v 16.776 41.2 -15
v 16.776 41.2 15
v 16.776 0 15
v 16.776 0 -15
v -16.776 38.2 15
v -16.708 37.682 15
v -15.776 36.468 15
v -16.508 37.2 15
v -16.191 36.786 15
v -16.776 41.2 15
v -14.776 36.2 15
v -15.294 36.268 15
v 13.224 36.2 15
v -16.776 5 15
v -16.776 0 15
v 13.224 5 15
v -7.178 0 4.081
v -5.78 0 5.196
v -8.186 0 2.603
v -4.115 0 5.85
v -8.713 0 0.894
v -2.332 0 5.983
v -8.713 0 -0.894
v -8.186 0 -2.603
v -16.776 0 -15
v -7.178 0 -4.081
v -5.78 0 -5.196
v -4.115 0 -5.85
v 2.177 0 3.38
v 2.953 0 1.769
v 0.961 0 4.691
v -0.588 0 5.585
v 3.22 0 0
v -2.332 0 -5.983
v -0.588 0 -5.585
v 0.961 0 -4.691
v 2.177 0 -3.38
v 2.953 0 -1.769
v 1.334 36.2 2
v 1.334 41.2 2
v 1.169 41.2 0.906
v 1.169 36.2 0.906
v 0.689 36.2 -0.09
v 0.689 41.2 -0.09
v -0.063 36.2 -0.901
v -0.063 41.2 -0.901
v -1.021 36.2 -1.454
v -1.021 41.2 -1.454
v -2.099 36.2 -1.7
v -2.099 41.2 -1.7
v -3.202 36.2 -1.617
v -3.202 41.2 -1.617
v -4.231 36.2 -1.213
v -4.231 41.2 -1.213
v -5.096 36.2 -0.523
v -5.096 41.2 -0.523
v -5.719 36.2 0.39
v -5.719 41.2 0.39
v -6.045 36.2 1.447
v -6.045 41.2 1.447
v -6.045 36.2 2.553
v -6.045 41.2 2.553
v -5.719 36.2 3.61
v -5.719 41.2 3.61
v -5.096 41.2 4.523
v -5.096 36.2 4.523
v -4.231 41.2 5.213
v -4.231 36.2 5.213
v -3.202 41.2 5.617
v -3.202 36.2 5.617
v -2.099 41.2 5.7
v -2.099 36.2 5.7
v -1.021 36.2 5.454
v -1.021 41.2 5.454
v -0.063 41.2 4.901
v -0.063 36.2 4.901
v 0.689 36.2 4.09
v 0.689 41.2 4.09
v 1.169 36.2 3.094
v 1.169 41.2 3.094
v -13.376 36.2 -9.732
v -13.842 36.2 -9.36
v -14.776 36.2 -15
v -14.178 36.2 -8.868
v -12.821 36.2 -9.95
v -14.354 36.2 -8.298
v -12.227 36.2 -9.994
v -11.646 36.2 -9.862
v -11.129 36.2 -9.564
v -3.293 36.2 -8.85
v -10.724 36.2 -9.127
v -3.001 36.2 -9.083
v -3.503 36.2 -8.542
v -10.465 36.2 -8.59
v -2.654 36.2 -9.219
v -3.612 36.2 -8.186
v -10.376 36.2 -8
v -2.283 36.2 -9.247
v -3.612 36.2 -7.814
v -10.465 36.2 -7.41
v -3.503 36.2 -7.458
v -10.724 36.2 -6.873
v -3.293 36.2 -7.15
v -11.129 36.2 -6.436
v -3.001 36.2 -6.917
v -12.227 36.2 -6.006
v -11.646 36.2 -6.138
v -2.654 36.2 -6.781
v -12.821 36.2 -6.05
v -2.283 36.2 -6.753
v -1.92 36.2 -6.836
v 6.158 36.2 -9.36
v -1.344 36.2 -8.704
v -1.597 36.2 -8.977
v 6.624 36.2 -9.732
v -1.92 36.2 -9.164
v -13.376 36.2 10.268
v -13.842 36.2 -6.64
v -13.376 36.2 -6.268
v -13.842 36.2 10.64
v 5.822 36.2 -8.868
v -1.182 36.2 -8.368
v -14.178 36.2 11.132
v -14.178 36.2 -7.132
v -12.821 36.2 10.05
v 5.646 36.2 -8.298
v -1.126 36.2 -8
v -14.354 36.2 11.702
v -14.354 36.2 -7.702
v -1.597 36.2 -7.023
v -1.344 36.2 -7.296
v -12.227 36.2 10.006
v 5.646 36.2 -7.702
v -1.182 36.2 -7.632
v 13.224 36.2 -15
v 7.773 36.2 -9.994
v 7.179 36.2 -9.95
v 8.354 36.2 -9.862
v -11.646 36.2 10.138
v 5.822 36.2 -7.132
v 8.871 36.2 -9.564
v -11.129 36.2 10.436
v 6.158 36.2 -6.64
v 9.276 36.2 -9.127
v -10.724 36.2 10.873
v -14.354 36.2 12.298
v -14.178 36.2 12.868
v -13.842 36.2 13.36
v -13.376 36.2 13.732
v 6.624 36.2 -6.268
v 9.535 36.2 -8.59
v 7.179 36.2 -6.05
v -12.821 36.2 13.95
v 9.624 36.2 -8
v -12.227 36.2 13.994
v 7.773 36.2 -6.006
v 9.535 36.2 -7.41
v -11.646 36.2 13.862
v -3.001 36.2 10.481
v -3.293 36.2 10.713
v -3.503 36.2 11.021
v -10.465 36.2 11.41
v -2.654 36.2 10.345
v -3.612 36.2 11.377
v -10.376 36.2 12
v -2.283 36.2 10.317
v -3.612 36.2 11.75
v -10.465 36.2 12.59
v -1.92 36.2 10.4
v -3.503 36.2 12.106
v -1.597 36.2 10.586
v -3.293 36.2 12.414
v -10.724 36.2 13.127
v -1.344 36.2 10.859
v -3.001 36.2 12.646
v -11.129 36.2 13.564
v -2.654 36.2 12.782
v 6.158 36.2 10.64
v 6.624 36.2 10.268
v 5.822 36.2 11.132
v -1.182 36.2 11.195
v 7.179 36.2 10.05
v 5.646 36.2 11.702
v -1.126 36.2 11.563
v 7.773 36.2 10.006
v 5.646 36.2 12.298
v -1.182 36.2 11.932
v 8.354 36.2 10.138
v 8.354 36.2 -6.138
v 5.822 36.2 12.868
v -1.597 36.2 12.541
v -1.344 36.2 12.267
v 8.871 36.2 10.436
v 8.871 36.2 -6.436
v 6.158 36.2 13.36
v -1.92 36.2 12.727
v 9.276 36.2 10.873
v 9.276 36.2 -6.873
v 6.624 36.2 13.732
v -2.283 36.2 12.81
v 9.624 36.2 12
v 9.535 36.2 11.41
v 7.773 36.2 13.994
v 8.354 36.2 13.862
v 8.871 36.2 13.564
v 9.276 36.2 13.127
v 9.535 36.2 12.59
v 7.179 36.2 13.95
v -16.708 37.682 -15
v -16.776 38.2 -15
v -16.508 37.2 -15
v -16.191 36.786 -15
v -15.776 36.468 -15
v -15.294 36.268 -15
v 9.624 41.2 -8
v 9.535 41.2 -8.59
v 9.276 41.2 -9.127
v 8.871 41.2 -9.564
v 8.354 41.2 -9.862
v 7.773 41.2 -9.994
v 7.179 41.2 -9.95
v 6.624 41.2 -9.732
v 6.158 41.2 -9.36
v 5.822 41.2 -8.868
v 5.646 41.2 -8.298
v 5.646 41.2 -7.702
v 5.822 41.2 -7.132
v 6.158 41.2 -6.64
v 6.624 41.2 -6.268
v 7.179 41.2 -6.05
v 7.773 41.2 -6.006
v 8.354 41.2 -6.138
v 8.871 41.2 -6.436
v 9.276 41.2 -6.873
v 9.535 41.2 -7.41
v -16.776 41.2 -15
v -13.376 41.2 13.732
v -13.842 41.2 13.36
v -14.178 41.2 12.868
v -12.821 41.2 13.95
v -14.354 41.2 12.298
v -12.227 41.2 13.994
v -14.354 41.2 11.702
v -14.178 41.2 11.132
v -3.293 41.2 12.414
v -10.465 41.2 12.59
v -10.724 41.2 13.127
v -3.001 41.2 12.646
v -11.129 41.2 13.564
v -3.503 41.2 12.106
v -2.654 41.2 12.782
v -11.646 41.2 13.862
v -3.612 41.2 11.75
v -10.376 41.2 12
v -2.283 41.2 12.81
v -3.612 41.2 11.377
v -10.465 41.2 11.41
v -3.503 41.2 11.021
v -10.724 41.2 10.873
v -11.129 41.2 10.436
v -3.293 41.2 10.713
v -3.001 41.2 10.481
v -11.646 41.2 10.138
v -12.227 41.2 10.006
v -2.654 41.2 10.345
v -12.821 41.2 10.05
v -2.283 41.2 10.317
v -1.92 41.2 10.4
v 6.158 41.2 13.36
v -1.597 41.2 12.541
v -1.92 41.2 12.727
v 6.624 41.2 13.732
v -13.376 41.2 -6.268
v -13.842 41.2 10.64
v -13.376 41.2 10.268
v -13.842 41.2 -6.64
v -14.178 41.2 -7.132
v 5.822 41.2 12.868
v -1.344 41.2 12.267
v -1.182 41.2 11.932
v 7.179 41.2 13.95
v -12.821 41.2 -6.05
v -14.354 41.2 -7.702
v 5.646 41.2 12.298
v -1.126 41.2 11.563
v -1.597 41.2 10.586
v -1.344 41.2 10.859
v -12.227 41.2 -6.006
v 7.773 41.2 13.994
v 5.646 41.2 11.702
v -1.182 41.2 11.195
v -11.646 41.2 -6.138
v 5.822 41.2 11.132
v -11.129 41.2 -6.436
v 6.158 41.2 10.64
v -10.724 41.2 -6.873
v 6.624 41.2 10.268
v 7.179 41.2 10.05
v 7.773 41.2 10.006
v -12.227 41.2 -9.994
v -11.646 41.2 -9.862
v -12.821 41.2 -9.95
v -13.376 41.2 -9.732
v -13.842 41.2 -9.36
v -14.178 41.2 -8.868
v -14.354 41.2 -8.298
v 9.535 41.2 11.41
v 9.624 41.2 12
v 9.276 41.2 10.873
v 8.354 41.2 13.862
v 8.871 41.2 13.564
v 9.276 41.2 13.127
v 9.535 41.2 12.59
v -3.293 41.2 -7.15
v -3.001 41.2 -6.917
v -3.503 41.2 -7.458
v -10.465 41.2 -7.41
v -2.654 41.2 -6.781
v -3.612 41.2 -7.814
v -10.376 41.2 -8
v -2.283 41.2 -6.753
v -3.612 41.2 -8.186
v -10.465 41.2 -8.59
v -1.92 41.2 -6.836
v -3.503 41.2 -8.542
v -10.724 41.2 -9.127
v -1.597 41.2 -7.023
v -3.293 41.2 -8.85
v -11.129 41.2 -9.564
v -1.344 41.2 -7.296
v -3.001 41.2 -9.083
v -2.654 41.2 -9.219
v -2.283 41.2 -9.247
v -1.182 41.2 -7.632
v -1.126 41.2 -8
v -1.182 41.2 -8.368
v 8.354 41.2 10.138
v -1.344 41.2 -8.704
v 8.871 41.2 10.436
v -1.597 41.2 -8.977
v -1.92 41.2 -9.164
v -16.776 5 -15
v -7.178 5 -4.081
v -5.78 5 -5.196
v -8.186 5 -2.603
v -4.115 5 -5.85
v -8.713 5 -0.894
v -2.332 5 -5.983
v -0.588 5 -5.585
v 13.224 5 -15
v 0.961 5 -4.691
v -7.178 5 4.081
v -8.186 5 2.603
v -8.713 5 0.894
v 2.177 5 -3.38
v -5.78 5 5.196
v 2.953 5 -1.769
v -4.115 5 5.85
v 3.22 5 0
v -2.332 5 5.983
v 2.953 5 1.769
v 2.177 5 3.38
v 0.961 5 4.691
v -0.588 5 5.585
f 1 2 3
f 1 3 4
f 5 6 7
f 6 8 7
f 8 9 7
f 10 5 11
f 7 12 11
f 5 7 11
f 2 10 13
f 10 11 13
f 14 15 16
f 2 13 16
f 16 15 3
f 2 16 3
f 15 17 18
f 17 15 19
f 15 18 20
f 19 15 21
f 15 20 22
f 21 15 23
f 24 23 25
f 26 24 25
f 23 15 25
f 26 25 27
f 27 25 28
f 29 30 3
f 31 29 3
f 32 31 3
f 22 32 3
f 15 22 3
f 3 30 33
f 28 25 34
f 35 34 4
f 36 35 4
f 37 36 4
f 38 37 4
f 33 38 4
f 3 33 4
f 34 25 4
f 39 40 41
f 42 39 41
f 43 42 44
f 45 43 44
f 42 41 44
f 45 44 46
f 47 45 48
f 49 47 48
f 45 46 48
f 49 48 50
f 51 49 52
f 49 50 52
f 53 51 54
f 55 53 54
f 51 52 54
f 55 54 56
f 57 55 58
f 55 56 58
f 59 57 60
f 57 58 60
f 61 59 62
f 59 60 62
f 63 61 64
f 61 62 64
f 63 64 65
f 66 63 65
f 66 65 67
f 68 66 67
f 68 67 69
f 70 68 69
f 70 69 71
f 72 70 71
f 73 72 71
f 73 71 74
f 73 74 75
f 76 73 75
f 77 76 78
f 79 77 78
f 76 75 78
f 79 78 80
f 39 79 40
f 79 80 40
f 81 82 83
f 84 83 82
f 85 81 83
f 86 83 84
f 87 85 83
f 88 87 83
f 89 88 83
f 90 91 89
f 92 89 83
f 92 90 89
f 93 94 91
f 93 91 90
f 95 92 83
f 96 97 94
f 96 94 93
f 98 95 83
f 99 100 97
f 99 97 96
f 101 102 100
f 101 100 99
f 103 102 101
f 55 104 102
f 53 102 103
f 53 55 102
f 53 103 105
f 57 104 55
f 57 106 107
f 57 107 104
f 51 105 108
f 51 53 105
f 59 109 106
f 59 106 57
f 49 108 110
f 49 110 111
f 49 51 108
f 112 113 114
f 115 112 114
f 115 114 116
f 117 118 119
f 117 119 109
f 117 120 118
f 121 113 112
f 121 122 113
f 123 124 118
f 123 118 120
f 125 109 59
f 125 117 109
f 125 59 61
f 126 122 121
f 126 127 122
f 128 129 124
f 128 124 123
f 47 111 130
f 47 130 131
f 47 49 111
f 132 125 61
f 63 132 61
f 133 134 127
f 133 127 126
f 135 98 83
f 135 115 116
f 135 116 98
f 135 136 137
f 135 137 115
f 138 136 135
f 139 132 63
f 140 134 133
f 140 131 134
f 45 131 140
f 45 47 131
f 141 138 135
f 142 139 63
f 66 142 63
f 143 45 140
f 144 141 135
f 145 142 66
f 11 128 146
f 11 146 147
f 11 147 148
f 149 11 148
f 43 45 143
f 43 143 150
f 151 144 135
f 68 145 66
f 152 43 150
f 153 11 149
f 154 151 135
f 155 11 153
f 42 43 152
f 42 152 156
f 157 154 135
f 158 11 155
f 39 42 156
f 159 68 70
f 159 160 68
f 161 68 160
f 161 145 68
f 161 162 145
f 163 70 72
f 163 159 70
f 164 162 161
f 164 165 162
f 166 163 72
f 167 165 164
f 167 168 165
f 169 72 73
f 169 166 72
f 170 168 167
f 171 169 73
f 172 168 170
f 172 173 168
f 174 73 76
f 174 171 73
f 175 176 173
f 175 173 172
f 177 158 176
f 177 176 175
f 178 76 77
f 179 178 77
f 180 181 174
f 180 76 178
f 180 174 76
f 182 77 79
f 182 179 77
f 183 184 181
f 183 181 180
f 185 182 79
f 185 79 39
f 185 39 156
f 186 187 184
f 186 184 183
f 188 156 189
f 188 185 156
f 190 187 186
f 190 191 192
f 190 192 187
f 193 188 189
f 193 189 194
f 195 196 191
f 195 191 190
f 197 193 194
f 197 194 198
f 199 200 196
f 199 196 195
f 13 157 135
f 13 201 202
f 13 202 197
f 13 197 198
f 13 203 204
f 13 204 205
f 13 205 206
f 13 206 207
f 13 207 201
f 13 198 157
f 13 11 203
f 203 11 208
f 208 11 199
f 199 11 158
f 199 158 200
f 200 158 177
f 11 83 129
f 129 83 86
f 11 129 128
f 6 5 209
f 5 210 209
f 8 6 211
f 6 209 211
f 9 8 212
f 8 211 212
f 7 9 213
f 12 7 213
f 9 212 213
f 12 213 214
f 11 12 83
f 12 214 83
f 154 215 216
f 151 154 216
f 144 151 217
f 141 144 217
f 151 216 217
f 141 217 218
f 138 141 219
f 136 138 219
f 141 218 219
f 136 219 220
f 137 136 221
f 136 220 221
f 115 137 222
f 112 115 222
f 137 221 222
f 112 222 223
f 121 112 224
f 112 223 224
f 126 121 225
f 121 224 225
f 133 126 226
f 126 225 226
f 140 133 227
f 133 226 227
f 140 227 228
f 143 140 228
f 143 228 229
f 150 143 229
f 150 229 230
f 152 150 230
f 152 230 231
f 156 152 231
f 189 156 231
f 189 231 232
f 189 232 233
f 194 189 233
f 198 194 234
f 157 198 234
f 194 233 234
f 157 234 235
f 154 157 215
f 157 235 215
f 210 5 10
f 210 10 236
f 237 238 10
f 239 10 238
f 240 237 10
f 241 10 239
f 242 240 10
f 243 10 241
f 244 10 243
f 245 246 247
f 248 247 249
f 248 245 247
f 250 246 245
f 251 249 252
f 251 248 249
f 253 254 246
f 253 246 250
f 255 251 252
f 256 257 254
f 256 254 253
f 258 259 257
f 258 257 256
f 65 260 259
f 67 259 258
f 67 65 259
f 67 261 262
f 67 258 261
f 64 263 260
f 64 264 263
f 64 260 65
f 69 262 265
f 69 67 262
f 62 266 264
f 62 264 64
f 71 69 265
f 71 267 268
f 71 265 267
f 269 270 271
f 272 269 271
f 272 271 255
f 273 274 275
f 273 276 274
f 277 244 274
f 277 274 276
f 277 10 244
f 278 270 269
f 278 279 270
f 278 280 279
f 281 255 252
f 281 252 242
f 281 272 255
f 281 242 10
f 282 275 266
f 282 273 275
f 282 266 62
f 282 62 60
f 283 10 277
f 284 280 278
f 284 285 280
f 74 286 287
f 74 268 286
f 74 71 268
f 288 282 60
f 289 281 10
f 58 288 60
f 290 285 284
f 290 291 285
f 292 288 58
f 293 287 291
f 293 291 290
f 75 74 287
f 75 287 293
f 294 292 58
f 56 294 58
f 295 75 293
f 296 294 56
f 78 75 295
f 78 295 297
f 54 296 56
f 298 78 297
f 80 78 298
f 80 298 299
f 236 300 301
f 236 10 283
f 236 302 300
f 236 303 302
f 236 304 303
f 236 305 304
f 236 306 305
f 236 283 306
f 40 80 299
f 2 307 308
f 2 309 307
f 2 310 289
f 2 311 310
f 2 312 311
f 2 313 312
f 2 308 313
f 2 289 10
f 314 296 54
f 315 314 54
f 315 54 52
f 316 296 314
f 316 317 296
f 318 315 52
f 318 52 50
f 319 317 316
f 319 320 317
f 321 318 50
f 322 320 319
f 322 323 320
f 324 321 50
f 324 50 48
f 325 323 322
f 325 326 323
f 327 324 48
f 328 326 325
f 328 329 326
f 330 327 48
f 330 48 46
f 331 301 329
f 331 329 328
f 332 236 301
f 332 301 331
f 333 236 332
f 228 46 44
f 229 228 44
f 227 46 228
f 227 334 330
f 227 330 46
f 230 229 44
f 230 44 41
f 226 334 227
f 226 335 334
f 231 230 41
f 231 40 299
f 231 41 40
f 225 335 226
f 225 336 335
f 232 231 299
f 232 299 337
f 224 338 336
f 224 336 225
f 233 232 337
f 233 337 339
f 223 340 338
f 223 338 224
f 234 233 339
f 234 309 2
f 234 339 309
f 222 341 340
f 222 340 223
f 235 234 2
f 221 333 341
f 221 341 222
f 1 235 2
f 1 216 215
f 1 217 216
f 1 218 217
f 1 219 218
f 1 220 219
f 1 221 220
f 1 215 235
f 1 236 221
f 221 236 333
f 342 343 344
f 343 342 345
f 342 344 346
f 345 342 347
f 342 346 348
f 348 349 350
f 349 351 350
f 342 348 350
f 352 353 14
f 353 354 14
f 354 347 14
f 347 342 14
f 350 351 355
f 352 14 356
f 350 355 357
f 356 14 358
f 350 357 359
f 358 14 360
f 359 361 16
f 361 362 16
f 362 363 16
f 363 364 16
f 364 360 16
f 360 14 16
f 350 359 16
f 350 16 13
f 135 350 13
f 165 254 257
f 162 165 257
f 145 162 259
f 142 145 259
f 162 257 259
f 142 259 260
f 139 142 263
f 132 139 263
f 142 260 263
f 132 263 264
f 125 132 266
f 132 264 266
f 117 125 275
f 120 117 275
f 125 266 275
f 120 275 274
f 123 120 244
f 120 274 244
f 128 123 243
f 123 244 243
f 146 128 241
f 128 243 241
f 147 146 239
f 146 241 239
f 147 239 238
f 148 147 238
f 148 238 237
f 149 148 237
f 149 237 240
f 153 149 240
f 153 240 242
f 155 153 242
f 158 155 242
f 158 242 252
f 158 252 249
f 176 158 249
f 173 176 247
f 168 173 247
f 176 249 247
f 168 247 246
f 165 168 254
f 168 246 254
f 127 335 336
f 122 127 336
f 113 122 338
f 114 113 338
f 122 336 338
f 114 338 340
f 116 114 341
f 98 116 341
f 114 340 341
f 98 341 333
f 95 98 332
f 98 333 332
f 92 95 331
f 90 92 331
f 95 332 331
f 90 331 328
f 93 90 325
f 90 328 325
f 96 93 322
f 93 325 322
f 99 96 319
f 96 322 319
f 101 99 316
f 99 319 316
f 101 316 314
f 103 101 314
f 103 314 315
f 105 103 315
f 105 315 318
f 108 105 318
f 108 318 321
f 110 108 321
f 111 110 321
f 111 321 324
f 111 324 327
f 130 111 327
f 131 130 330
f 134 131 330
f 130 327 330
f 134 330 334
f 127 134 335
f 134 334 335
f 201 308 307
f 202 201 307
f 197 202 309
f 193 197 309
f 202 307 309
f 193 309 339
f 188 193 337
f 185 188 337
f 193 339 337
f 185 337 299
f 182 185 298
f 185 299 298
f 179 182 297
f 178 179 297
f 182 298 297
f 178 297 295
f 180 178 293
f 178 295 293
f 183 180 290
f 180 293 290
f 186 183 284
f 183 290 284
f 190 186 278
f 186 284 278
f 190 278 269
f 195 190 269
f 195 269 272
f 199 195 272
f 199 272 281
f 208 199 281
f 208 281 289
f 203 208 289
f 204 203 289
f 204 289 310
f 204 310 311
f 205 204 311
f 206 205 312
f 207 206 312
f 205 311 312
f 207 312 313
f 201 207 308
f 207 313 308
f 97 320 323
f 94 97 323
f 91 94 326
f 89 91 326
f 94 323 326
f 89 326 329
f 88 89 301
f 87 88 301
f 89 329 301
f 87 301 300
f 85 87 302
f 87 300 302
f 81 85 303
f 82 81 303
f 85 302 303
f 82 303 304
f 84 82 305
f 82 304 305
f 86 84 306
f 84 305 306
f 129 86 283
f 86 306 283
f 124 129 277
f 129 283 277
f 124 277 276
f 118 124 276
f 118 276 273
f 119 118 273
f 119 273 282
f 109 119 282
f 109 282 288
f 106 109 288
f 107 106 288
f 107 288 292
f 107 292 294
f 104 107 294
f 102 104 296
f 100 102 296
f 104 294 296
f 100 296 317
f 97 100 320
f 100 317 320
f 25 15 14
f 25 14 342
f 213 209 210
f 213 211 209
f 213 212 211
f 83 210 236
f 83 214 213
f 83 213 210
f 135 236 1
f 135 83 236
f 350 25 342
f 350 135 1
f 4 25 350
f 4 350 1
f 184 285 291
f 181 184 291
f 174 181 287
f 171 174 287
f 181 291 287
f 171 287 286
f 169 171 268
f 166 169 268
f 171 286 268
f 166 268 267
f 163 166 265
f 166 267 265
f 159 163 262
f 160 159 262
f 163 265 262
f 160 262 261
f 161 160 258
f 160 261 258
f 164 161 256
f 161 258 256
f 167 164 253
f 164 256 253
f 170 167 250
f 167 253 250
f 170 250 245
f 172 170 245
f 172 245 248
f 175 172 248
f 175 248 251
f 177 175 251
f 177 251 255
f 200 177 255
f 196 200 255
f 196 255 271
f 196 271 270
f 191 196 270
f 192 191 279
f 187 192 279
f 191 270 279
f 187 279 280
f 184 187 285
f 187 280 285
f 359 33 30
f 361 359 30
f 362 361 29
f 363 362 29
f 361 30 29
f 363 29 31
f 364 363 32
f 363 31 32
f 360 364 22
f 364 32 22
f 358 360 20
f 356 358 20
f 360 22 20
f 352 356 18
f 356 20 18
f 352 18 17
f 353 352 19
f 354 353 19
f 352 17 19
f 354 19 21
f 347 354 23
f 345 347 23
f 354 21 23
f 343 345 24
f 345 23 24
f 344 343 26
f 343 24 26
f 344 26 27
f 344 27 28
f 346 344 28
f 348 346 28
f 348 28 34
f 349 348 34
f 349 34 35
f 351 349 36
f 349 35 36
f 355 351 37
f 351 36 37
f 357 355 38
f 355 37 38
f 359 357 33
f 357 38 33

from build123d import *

# Parameters (mm, degrees)
CROQUIS1_W              = 33.552631578
CROQUIS1_H              = 30
SALIENTE_EXTRUIR1_DEPTH = 41.2
CROQUIS2_W              = 30
CROQUIS2_H              = 31.2
CORTAR_EXTRUIR1_DEPTH   = 36.2
CROQUIS3_R              = 2
CROQUIS3_R_2            = 1.25
CROQUIS3_R_3            = 3.71
CORTAR_EXTRUIR2_DEPTH   = 5
CROQUIS4_R              = 6
CORTAR_EXTRUIR3_DEPTH   = 5
REDONDEO1_R             = 2


with BuildPart() as part:
    # Croquis1 → Saliente-Extruir1 (new body)
    with BuildSketch(Plane(origin=(0, 0, 0), x_dir=(1, 0, 0), z_dir=(0, 1, 0))):
        Rectangle(CROQUIS1_W, CROQUIS1_H)
    extrude(amount=SALIENTE_EXTRUIR1_DEPTH)

    # Croquis2 → Cortar-Extruir1 (cut)
    with BuildSketch(Plane.XY.offset(15)):
        with Locations((-1.776315789, 20.6)):
            Rectangle(CROQUIS2_W, CROQUIS2_H)
    extrude(amount=-CORTAR_EXTRUIR1_DEPTH, mode=Mode.SUBTRACT)

    # Croquis3 → Cortar-Extruir2 (cut)
    with BuildSketch(Plane(origin=(0, 41.2, 0), x_dir=(1, 0, 0), z_dir=(0, 1, 0))):
        with Locations((-12.376315789, -12)):
            Circle(CROQUIS3_R)
        with Locations((-2.376315789, -11.563330836)):
            Circle(CROQUIS3_R_2)
        with Locations((7.623684211, -12)):
            Circle(CROQUIS3_R)
        with Locations((-2.376315789, -2)):
            Circle(CROQUIS3_R_3)
        with Locations((7.623684211, 8)):
            Circle(CROQUIS3_R)
        with Locations((-2.376315789, 8)):
            Circle(CROQUIS3_R_2)
        with Locations((-12.376315789, 8)):
            Circle(CROQUIS3_R)
    extrude(amount=-CORTAR_EXTRUIR2_DEPTH, mode=Mode.SUBTRACT)

    # Croquis4 → Cortar-Extruir3 (cut)
    with BuildSketch(Plane.XZ):
        with Locations((-2.779999999, 0)):
            Circle(CROQUIS4_R)
    extrude(amount=-CORTAR_EXTRUIR3_DEPTH, mode=Mode.SUBTRACT)

    # Redondeo1
    redondeo1_edges = [part.edges().sort_by_distance(p)[0] for p in [
        (-16.776315789, 36.2, 0),
    ]]
    fillet(redondeo1_edges, radius=REDONDEO1_R)


solid = part.part
